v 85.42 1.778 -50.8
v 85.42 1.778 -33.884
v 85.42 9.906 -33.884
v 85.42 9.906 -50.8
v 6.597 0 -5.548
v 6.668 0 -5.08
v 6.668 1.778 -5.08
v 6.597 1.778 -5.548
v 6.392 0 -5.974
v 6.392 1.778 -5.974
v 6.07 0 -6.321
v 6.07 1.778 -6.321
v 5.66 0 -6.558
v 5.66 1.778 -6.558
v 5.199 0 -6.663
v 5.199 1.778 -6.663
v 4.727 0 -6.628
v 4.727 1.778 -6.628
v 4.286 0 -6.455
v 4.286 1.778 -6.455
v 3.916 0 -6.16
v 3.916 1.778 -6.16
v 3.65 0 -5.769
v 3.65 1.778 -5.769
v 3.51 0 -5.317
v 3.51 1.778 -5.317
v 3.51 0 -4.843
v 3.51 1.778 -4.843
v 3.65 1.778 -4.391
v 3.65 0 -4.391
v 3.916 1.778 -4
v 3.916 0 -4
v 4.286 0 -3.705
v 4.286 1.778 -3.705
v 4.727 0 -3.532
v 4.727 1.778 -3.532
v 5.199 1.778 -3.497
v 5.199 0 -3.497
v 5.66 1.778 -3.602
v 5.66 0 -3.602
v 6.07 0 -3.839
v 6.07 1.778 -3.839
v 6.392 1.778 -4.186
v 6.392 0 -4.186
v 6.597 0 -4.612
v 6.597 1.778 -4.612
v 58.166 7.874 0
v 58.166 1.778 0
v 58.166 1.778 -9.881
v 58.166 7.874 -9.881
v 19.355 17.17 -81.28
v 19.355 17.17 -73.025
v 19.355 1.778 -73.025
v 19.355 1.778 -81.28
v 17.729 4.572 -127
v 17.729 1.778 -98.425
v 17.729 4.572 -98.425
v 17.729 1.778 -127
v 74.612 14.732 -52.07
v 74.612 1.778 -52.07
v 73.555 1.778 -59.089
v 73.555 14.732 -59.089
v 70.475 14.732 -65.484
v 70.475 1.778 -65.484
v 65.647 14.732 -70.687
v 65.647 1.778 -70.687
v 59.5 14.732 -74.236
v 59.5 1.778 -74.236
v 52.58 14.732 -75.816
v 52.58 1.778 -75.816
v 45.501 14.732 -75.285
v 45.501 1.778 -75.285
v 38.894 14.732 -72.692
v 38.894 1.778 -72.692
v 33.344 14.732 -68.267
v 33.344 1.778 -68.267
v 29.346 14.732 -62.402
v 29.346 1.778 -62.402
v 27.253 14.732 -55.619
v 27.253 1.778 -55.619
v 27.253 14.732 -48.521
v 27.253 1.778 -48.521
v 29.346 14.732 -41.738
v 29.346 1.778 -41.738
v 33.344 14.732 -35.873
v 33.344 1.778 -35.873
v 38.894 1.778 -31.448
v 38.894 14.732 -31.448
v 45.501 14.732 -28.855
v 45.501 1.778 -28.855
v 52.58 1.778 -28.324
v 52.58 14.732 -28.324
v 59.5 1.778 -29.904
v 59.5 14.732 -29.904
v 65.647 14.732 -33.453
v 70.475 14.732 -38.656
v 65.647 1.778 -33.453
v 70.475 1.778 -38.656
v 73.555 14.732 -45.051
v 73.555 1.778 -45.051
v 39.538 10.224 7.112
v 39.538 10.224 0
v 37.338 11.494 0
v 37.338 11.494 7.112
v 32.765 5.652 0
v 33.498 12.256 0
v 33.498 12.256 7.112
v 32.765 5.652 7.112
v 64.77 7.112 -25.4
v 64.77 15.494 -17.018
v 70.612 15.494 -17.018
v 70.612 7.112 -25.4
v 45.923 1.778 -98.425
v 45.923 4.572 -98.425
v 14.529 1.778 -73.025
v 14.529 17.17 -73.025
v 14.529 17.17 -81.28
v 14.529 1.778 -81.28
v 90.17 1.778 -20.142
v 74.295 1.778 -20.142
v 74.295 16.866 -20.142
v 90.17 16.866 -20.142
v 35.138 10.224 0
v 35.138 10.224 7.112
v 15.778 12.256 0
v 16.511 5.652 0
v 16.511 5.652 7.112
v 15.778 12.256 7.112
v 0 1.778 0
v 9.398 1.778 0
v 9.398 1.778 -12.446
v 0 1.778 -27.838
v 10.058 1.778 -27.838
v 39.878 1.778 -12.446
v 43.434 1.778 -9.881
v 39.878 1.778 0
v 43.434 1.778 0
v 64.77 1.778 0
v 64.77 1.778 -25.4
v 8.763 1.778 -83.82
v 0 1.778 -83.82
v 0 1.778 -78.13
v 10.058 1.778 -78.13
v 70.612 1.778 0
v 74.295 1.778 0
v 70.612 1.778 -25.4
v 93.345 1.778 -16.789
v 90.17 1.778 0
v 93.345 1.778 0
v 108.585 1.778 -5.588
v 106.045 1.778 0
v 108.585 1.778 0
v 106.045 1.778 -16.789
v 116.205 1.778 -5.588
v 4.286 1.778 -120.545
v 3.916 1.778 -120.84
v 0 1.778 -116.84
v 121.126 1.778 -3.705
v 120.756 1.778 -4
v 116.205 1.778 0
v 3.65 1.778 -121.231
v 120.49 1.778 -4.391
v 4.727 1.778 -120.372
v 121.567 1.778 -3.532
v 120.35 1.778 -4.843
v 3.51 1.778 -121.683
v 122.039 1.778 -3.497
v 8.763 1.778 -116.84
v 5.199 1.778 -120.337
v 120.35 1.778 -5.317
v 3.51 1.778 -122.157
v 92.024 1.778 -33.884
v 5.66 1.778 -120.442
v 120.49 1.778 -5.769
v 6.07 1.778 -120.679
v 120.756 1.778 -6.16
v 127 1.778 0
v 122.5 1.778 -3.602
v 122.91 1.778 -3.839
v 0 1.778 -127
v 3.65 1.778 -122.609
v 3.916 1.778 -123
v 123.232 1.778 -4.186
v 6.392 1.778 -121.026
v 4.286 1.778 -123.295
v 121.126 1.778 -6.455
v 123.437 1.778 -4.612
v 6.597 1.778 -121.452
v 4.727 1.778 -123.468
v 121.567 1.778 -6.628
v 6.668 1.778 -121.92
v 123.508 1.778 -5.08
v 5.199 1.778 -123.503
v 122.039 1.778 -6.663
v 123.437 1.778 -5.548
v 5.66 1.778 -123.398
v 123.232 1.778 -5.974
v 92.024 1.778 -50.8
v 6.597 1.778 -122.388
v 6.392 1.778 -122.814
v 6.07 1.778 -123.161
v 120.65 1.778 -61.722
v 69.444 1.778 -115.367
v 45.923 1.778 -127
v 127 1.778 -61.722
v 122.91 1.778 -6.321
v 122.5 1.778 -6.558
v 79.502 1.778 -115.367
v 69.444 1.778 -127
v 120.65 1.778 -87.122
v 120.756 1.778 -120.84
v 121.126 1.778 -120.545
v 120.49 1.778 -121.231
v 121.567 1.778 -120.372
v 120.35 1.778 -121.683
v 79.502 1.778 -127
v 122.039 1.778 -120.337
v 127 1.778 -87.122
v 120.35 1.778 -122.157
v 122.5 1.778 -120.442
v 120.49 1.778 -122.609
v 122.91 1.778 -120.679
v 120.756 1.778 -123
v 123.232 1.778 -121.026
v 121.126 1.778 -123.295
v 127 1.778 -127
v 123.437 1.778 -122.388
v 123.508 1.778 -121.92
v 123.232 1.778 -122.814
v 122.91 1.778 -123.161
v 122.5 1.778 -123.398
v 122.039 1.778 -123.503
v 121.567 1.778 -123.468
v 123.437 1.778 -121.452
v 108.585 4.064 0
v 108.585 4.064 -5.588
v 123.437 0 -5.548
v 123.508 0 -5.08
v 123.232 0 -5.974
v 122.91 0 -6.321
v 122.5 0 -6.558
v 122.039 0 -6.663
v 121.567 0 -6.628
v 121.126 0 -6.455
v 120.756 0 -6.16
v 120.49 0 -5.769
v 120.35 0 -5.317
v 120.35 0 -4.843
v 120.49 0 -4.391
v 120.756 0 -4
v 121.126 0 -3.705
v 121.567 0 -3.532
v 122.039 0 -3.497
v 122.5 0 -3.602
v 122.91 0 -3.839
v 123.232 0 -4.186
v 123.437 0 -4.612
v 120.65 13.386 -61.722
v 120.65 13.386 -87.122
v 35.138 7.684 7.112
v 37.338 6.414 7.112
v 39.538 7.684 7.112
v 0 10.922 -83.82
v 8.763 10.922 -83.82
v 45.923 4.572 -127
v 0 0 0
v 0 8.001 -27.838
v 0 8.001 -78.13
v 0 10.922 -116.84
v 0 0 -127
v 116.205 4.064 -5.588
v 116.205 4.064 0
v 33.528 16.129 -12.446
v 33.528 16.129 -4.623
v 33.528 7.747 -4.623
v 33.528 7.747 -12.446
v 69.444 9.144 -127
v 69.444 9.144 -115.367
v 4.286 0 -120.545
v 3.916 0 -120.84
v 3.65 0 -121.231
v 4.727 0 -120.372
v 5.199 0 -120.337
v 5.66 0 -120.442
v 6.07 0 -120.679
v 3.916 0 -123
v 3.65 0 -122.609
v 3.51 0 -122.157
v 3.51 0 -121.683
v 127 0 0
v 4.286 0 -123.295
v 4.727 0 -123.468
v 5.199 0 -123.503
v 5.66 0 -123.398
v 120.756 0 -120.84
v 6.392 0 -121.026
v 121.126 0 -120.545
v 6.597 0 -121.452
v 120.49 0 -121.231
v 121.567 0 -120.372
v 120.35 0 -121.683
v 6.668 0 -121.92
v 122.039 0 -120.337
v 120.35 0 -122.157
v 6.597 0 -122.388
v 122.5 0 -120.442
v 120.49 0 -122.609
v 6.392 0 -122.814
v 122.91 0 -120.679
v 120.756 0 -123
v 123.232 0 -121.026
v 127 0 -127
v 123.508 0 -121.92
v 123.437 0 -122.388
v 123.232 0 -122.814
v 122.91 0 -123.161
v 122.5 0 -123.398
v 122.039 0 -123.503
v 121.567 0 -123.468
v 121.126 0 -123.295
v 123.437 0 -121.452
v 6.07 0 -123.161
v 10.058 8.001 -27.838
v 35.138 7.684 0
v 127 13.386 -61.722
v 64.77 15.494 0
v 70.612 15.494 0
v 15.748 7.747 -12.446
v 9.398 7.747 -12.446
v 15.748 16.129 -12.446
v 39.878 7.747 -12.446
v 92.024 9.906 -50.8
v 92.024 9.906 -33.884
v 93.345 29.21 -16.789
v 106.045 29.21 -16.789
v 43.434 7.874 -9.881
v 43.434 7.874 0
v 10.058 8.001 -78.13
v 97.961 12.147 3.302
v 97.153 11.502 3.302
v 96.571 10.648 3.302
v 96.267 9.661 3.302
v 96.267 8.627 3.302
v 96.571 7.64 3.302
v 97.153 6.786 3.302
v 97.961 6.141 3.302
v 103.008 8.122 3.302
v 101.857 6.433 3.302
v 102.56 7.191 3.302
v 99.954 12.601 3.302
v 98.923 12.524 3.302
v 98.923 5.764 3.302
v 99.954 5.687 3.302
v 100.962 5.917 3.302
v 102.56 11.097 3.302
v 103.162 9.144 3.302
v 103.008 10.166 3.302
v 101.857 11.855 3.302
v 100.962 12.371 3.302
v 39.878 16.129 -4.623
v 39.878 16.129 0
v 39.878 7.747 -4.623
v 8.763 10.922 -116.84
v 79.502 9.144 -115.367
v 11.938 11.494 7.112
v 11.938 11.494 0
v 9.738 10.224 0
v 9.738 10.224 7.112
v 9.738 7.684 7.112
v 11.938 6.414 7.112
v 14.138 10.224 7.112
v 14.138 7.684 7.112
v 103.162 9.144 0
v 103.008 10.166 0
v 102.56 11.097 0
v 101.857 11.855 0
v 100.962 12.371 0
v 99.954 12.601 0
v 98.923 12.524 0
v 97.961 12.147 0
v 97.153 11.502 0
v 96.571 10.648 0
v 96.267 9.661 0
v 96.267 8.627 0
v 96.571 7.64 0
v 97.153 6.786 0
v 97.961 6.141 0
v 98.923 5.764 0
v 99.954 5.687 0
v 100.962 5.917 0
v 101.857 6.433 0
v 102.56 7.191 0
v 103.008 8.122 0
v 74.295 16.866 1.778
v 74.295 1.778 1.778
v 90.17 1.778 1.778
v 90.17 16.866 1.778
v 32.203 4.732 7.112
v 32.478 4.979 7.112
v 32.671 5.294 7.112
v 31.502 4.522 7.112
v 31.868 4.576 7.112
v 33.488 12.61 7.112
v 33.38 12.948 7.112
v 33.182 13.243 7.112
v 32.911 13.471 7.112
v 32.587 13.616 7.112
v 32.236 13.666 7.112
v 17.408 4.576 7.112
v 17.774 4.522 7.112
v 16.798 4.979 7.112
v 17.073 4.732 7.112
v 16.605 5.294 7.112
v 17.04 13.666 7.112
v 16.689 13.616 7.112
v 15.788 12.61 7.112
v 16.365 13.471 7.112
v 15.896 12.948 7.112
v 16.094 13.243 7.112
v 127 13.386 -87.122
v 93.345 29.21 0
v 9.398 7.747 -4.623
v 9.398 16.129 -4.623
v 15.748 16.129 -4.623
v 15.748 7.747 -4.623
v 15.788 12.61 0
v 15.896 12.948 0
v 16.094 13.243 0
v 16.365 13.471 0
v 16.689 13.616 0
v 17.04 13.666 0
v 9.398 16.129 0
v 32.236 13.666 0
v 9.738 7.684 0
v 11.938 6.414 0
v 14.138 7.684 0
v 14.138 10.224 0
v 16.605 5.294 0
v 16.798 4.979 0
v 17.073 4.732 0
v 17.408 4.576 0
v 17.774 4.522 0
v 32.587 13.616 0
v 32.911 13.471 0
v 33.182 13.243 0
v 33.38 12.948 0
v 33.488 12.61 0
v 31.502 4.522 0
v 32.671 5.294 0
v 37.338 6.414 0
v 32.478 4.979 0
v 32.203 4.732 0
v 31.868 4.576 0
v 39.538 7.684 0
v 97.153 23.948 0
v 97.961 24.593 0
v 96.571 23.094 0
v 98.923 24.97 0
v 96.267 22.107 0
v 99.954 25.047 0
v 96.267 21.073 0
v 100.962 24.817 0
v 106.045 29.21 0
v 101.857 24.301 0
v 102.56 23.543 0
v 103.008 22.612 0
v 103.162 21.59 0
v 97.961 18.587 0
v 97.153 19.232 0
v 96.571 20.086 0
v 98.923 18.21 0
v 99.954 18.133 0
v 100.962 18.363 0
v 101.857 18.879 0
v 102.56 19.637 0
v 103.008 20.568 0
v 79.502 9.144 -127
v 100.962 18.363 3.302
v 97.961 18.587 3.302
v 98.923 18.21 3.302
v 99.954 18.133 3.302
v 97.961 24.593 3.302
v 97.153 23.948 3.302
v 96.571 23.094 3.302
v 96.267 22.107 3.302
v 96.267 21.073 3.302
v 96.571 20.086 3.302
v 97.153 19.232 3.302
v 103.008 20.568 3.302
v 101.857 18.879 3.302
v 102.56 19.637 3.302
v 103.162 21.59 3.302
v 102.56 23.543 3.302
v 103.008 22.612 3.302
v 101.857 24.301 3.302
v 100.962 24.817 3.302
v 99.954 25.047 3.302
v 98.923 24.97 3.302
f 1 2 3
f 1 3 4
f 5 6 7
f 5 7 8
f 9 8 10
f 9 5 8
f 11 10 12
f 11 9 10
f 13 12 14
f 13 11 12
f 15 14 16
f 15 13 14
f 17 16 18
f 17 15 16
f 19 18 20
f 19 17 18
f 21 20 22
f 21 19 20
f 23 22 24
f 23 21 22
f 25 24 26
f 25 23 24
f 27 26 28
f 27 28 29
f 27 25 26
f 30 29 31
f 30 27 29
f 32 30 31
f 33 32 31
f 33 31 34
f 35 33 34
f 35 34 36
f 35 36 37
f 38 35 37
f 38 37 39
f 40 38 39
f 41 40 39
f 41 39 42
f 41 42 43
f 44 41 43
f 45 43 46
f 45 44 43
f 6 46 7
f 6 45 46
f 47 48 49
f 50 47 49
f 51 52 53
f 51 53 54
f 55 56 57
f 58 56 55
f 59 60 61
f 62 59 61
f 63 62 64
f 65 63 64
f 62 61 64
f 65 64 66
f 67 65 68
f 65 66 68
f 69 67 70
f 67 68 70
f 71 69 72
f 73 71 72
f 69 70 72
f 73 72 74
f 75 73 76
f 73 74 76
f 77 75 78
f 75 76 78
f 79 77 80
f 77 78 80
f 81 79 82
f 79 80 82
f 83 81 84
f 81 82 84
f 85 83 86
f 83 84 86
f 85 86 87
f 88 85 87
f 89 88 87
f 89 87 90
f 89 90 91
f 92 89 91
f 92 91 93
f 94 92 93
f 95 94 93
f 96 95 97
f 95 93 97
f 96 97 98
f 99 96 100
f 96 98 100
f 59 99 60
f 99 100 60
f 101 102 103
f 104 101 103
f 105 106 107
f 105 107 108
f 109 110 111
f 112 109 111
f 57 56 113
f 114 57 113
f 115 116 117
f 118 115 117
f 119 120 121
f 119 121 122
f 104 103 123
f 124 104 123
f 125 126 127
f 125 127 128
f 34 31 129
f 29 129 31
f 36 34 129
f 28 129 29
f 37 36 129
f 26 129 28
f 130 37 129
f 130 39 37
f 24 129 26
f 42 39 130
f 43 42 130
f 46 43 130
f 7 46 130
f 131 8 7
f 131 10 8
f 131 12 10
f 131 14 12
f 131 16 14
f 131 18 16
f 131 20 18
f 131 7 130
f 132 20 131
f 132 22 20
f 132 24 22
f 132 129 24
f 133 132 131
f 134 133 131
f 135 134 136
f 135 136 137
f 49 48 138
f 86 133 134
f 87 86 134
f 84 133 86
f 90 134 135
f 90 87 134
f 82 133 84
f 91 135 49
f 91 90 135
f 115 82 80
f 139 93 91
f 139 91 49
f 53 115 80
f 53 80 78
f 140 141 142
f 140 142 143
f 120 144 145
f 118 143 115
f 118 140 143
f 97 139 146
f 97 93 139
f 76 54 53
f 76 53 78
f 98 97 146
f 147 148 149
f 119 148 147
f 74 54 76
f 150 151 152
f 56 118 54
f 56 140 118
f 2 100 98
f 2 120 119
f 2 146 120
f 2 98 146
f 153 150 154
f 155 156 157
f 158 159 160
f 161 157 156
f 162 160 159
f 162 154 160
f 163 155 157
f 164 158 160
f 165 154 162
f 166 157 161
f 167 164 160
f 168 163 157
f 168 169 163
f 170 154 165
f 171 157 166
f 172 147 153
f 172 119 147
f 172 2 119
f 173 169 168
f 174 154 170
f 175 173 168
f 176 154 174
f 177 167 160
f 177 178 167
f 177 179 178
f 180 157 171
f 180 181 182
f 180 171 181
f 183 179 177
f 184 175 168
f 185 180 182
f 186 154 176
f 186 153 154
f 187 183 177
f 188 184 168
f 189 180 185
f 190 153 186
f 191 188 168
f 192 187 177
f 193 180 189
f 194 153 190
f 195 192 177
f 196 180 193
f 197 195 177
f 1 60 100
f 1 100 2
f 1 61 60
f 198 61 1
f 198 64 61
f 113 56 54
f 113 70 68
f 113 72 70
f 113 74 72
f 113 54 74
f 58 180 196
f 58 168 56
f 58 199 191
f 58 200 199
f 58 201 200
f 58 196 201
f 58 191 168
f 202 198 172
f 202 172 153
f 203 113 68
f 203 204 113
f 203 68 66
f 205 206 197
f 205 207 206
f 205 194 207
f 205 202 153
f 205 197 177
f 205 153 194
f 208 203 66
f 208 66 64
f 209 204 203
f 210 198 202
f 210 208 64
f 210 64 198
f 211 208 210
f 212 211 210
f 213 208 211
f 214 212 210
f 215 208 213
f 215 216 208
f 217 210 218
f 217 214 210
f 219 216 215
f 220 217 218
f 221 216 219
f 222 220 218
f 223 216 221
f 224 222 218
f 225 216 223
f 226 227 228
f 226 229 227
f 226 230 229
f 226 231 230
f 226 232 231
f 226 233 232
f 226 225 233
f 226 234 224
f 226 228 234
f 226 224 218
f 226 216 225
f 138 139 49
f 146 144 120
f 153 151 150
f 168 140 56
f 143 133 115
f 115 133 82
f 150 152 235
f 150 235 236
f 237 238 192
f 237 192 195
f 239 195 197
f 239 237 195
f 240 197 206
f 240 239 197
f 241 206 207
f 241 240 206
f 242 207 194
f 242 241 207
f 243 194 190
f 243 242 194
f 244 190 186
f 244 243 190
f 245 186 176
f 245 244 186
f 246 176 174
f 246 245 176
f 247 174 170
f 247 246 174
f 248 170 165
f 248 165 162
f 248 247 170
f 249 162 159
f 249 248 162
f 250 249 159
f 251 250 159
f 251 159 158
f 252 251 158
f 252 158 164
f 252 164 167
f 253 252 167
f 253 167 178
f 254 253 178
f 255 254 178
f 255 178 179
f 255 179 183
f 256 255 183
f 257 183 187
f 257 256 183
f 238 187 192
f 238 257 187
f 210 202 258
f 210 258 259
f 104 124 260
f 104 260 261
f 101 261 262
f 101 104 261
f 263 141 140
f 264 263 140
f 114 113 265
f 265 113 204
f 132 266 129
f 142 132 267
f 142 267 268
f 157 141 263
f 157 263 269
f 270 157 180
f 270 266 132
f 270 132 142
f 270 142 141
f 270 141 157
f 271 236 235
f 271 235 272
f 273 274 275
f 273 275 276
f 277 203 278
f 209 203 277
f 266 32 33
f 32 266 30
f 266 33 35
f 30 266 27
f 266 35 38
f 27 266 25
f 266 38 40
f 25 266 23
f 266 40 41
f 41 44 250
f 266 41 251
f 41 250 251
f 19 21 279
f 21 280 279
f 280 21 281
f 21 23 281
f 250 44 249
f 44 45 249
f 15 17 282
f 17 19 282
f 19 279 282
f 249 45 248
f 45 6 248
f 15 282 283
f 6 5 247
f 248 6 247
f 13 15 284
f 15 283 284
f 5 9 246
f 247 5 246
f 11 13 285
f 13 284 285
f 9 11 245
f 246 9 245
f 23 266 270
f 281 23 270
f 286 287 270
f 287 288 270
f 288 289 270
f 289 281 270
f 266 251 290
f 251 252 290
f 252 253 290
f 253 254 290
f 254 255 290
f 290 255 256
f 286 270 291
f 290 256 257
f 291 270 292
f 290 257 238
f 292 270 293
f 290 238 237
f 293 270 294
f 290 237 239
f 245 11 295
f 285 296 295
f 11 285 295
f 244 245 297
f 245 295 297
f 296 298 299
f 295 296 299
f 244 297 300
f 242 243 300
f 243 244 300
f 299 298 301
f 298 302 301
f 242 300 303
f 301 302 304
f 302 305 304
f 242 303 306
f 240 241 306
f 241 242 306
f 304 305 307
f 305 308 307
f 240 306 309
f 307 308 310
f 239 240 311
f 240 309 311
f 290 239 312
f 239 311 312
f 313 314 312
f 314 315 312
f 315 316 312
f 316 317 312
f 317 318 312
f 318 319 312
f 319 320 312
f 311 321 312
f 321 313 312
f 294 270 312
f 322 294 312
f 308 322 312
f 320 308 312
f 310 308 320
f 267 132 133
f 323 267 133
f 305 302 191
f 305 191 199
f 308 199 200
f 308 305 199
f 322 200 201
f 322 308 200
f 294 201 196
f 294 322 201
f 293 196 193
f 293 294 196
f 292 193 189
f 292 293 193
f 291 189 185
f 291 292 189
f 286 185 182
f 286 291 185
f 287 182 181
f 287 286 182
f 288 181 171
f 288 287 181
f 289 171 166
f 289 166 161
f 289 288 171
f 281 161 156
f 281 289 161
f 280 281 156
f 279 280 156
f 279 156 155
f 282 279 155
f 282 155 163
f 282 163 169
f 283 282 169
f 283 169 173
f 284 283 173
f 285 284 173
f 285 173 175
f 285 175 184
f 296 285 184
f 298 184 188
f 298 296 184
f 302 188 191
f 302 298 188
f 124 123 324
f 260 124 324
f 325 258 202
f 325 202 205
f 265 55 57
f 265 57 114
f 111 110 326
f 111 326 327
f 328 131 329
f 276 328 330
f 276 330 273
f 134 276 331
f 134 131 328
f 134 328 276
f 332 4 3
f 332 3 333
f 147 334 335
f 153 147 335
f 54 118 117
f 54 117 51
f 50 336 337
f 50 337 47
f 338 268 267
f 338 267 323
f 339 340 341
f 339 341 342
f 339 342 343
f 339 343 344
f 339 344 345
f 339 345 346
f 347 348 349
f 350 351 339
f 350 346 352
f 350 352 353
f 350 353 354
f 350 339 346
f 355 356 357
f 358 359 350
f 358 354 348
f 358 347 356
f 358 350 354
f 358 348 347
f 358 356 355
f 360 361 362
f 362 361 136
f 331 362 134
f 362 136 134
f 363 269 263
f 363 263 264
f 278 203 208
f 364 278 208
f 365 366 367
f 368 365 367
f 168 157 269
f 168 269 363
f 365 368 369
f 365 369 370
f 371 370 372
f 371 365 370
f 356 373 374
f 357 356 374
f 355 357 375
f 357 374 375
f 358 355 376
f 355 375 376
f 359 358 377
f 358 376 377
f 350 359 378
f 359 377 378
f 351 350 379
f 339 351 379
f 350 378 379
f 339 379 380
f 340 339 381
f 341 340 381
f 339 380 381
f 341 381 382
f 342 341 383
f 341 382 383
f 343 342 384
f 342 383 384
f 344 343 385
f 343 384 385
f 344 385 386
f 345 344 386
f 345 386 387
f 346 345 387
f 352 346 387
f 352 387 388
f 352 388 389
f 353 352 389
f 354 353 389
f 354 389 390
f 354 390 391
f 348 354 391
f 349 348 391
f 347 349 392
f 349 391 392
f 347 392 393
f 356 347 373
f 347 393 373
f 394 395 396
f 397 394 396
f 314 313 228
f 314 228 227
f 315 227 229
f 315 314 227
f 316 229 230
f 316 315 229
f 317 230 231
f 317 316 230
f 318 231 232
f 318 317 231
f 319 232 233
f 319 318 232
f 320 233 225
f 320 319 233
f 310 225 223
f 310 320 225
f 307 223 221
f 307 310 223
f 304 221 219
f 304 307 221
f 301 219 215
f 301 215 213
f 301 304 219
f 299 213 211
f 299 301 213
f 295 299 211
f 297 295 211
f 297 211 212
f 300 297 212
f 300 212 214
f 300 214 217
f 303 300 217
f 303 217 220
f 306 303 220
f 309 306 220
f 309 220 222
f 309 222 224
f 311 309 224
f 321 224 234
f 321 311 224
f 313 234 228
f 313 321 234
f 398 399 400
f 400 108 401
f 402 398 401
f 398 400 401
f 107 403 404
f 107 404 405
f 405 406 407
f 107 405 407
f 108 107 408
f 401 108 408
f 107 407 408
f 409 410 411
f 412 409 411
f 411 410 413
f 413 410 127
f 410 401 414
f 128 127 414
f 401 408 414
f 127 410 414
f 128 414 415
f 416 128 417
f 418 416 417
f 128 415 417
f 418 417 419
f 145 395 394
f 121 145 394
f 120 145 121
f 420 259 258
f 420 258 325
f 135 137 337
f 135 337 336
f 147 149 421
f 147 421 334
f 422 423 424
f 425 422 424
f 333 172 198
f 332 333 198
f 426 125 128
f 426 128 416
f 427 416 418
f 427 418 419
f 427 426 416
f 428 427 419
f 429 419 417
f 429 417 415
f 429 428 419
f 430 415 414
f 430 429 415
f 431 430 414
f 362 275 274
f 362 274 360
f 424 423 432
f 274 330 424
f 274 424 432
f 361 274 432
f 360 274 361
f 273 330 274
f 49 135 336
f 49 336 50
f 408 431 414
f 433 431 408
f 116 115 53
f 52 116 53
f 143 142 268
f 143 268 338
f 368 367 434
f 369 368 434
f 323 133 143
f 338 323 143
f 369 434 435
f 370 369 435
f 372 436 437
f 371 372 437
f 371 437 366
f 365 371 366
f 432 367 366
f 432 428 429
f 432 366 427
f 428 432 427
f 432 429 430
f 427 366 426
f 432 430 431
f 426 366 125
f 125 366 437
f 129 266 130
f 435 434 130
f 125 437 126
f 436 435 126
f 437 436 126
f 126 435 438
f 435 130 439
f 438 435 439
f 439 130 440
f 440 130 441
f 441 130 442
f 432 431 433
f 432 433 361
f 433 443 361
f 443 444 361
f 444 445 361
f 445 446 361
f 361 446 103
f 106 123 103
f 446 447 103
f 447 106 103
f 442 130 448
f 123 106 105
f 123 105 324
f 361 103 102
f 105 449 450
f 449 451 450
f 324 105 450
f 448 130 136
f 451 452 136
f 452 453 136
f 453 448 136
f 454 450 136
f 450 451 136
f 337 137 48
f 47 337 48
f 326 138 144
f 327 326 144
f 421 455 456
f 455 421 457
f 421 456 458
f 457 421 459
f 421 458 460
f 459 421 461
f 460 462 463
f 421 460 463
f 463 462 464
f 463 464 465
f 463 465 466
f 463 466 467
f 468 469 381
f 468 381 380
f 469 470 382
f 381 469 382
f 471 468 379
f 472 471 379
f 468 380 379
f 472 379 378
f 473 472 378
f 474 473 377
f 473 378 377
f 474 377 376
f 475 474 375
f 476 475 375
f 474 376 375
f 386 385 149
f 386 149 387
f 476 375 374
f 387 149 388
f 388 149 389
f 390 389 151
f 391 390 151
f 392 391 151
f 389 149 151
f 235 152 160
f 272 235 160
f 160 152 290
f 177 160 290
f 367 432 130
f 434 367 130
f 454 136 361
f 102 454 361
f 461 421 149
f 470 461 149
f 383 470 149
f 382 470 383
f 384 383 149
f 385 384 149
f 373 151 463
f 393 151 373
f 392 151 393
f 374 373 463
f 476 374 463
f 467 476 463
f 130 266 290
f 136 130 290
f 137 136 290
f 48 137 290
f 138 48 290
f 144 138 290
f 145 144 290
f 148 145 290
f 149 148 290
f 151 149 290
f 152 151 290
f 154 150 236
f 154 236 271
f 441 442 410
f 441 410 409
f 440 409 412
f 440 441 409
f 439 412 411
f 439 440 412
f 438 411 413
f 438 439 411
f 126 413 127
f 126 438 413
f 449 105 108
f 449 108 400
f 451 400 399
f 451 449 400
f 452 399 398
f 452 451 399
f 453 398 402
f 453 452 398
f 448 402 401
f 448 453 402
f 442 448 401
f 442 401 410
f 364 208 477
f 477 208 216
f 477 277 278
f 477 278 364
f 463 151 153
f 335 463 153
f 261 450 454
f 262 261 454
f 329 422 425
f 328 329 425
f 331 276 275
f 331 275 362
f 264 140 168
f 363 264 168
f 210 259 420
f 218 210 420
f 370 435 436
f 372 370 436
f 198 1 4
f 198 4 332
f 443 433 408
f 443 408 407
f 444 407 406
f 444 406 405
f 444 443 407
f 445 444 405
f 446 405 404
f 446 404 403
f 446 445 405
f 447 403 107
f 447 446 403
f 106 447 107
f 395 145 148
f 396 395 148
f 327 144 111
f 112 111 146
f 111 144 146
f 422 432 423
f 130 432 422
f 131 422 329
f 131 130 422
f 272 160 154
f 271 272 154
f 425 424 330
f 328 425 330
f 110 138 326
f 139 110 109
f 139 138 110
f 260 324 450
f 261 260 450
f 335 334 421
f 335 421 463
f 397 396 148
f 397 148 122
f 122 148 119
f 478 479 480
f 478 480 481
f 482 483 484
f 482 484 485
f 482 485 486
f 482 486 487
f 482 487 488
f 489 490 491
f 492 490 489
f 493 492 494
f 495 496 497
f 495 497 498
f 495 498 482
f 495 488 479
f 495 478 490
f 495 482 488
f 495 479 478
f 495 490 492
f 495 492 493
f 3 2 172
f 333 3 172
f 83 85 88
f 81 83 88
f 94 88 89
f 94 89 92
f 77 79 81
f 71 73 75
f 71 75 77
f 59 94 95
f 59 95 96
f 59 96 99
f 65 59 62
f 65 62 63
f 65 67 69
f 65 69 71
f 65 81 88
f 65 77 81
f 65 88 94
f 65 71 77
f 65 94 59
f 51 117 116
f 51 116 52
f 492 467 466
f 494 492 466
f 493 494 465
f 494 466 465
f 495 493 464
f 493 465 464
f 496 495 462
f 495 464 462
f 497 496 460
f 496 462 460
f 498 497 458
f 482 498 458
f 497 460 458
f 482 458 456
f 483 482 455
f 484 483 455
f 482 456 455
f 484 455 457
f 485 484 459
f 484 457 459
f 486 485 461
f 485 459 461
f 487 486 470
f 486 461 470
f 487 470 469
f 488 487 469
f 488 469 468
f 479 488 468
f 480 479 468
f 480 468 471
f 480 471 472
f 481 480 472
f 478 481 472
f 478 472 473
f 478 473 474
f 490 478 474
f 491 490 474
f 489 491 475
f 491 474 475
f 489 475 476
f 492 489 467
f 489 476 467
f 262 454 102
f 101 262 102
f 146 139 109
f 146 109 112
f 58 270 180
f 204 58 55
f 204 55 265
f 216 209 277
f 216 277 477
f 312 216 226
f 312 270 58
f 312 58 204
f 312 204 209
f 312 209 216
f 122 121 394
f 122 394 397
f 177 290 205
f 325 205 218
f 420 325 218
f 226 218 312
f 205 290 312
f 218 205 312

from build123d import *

# Parameters (mm, degrees)
SKETCH1_W            = 127
SKETCH1_H            = 127
SKETCH1_R            = 1.5875
BOSS_EXTRUDE1_DEPTH  = 1.778
SKETCH2_W            = 28.194
SKETCH2_H            = 28.575
BOSS_EXTRUDE2_DEPTH  = 2.794
SKETCH3_W            = 10.0584
SKETCH3_H            = 11.6332
BOSS_EXTRUDE3_DEPTH  = 7.366
SKETCH4_W            = 6.35
SKETCH4_H            = 25.4
BOSS_EXTRUDE4_DEPTH  = 11.6078
SKETCH5_W            = 8.763
SKETCH5_H            = 33.02
BOSS_EXTRUDE5_DEPTH  = 9.144
SKETCH6_W            = 10.0584
SKETCH6_H            = 50.292
BOSS_EXTRUDE6_DEPTH  = 6.223
SKETCH7_W            = 4.826
SKETCH7_H            = 8.255
BOSS_EXTRUDE7_DEPTH  = 15.3924
SKETCH8_W            = 7.62
SKETCH8_H            = 5.588
BOSS_EXTRUDE8_DEPTH  = 2.286
SKETCH9_R            = 23.8125
BOSS_EXTRUDE9_DEPTH  = 12.954
SKETCH10_W           = 12.7
SKETCH10_H           = 16.7894
BOSS_EXTRUDE10_DEPTH = 27.432
SKETCH11_R           = 3.4671
BOSS_EXTRUDE11_DEPTH = 3.302
SKETCH12_W           = 15.875
SKETCH12_H           = 21.9202
BOSS_EXTRUDE12_DEPTH = 15.0876
SKETCH13_W           = 5.842
SKETCH13_H           = 25.4
BOSS_EXTRUDE13_DEPTH = 13.716
CHAMFER1_SIZE        = 8.382
SKETCH14_W           = 14.732
SKETCH14_H           = 9.8806
BOSS_EXTRUDE14_DEPTH = 6.096
SKETCH15_W           = 6.604
SKETCH15_H           = 16.9164
BOSS_EXTRUDE15_DEPTH = 8.128
SKETCH16_W           = 30.48
SKETCH16_H           = 12.446
BOSS_EXTRUDE16_DEPTH = 14.351
SKETCH17_W           = 6.35
SKETCH17_H           = 7.8232
CUT_EXTRUDE1_DEPTH   = 8.382
BOSS_EXTRUDE17_DEPTH = 7.112


with BuildPart() as part:
    # Sketch1 → Boss-Extrude1 (new body)
    with BuildSketch(Plane(origin=(0, 0, 0), x_dir=(1, 0, 0), z_dir=(0, 1, 0))):
        with Locations((63.5, 63.5)):
            Rectangle(SKETCH1_W, SKETCH1_H)
        with Locations((5.08, 121.92)):
            Circle(SKETCH1_R, mode=Mode.SUBTRACT)
        with Locations((121.92, 121.92)):
            Circle(SKETCH1_R, mode=Mode.SUBTRACT)
        with Locations((121.92, 5.08)):
            Circle(SKETCH1_R, mode=Mode.SUBTRACT)
        with Locations((5.08, 5.08)):
            Circle(SKETCH1_R, mode=Mode.SUBTRACT)
    extrude(amount=BOSS_EXTRUDE1_DEPTH)

    # Sketch2 → Boss-Extrude2 (add)
    with BuildSketch(Plane(origin=(0, 1.778, 0), x_dir=(1, 0, 0), z_dir=(0, 1, 0))):
        with Locations((31.8262, 112.7125)):
            Rectangle(SKETCH2_W, SKETCH2_H)
    extrude(amount=BOSS_EXTRUDE2_DEPTH)

    # Sketch3 → Boss-Extrude3 (add)
    with BuildSketch(Plane(origin=(0, 1.778, 0), x_dir=(1, 0, 0), z_dir=(0, 1, 0))):
        with Locations((74.4728, 121.1834)):
            Rectangle(SKETCH3_W, SKETCH3_H)
    extrude(amount=BOSS_EXTRUDE3_DEPTH)

    # Sketch4 → Boss-Extrude4 (add)
    with BuildSketch(Plane(origin=(0, 1.778, 0), x_dir=(1, 0, 0), z_dir=(0, 1, 0))):
        with Locations((123.825, 74.422)):
            Rectangle(SKETCH4_W, SKETCH4_H)
    extrude(amount=BOSS_EXTRUDE4_DEPTH)

    # Sketch5 → Boss-Extrude5 (add)
    with BuildSketch(Plane(origin=(0, 1.778, 0), x_dir=(1, 0, 0), z_dir=(0, 1, 0))):
        with Locations((4.3815, 100.33)):
            Rectangle(SKETCH5_W, SKETCH5_H)
    extrude(amount=BOSS_EXTRUDE5_DEPTH)

    # Sketch6 → Boss-Extrude6 (add)
    with BuildSketch(Plane(origin=(0, 1.778, 0), x_dir=(1, 0, 0), z_dir=(0, 1, 0))):
        with Locations((5.0292, 52.9844)):
            Rectangle(SKETCH6_W, SKETCH6_H)
    extrude(amount=BOSS_EXTRUDE6_DEPTH)

    # Sketch7 → Boss-Extrude7 (add)
    with BuildSketch(Plane(origin=(0, 1.778, 0), x_dir=(1, 0, 0), z_dir=(0, 1, 0))):
        with Locations((16.9418, 77.1525)):
            Rectangle(SKETCH7_W, SKETCH7_H)
    extrude(amount=BOSS_EXTRUDE7_DEPTH)

    # Sketch8 → Boss-Extrude8 (add)
    with BuildSketch(Plane(origin=(0, 1.778, 0), x_dir=(1, 0, 0), z_dir=(0, 1, 0))):
        with Locations((112.395, 2.794)):
            Rectangle(SKETCH8_W, SKETCH8_H)
    extrude(amount=BOSS_EXTRUDE8_DEPTH)

    # Sketch9 → Boss-Extrude9 (add)
    with BuildSketch(Plane(origin=(0, 1.778, 0), x_dir=(1, 0, 0), z_dir=(0, 1, 0))):
        with Locations((50.8, 52.07)):
            Circle(SKETCH9_R)
    extrude(amount=BOSS_EXTRUDE9_DEPTH)

    # Sketch10 → Boss-Extrude10 (add)
    with BuildSketch(Plane(origin=(0, 1.778, 0), x_dir=(1, 0, 0), z_dir=(0, 1, 0))):
        with Locations((99.695, 8.3947)):
            Rectangle(SKETCH10_W, SKETCH10_H)
    extrude(amount=BOSS_EXTRUDE10_DEPTH)

    # Sketch11 → Boss-Extrude11 (add)
    with BuildSketch(Plane.XY):
        with Locations((99.695, 21.59)):
            Circle(SKETCH11_R)
        with Locations((99.695, 9.144)):
            Circle(SKETCH11_R)
    extrude(amount=BOSS_EXTRUDE11_DEPTH)

    # Sketch12 → Boss-Extrude12 (add)
    with BuildSketch(Plane(origin=(0, 1.778, 0), x_dir=(1, 0, 0), z_dir=(0, 1, 0))):
        with Locations((82.2325, 9.1821)):
            Rectangle(SKETCH12_W, SKETCH12_H)
    extrude(amount=BOSS_EXTRUDE12_DEPTH)

    # Sketch13 → Boss-Extrude13 (add)
    with BuildSketch(Plane(origin=(0, 1.778, 0), x_dir=(1, 0, 0), z_dir=(0, 1, 0))):
        with Locations((67.691, 12.7)):
            Rectangle(SKETCH13_W, SKETCH13_H)
    extrude(amount=BOSS_EXTRUDE13_DEPTH)

    # Chamfer1
    chamfer1_edges = [part.edges().sort_by_distance(p)[0] for p in [
        (67.691, 15.494, -25.4),
    ]]
    chamfer(chamfer1_edges, length=CHAMFER1_SIZE)

    # Sketch14 → Boss-Extrude14 (add)
    with BuildSketch(Plane(origin=(0, 1.778, 0), x_dir=(1, 0, 0), z_dir=(0, 1, 0))):
        with Locations((50.8, 4.9403)):
            Rectangle(SKETCH14_W, SKETCH14_H)
    extrude(amount=BOSS_EXTRUDE14_DEPTH)

    # Sketch15 → Boss-Extrude15 (add)
    with BuildSketch(Plane(origin=(0, 1.778, 0), x_dir=(1, 0, 0), z_dir=(0, 1, 0))):
        with Locations((88.7222, 42.3418)):
            Rectangle(SKETCH15_W, SKETCH15_H)
    extrude(amount=BOSS_EXTRUDE15_DEPTH)

    # Sketch16 → Boss-Extrude16 (add)
    with BuildSketch(Plane(origin=(0, 1.778, 0), x_dir=(1, 0, 0), z_dir=(0, 1, 0))):
        with Locations((24.638, 6.223)):
            Rectangle(SKETCH16_W, SKETCH16_H)
    extrude(amount=BOSS_EXTRUDE16_DEPTH)

    # Sketch17 → Cut-Extrude1 (cut)
    with BuildSketch(Plane(origin=(0, 16.129, 0), x_dir=(1, 0, 0), z_dir=(0, 1, 0))):
        with Locations((12.573, 8.5344)):
            Rectangle(SKETCH17_W, SKETCH17_H)
        with Locations((36.703, 8.5344)):
            Rectangle(SKETCH17_W, SKETCH17_H)
    extrude(amount=-CUT_EXTRUDE1_DEPTH, mode=Mode.SUBTRACT)

    # Sketch18 → Boss-Extrude17 (add)
    with BuildSketch(Plane.XY):
        Polygon((11.938, 11.4935), (9.738295474, 10.2235), (9.738295474, 7.6835), (11.938, 6.4135), (14.137704526, 7.6835), (14.137704526, 10.2235), align=None)
        Polygon((37.338, 11.4935), (35.138295474, 10.2235), (35.138295474, 7.6835), (37.338, 6.4135), (39.537704526, 7.6835), (39.537704526, 10.2235), align=None)
        with BuildLine():
            Line((17.039926569, 13.665748038), (32.236073431, 13.665748038))
            ThreePointArc((32.236073431, 13.665748038), (33.182386013, 13.242738295), (33.498305774, 12.2555))
            Line((33.498305774, 12.2555), (32.764527996, 5.6515))
            ThreePointArc((32.764527996, 5.6515), (32.34928591, 4.845435455), (31.502295653, 4.521748038))
            Line((31.502295653, 4.521748038), (17.773704347, 4.521748038))
            ThreePointArc((17.773704347, 4.521748038), (16.92671409, 4.845435455), (16.511472004, 5.6515))
            Line((16.511472004, 5.6515), (15.777694226, 12.2555))
            ThreePointArc((15.777694226, 12.2555), (16.093613987, 13.242738295), (17.039926569, 13.665748038))
        make_face()
    extrude(amount=BOSS_EXTRUDE17_DEPTH)


solid = part.part
